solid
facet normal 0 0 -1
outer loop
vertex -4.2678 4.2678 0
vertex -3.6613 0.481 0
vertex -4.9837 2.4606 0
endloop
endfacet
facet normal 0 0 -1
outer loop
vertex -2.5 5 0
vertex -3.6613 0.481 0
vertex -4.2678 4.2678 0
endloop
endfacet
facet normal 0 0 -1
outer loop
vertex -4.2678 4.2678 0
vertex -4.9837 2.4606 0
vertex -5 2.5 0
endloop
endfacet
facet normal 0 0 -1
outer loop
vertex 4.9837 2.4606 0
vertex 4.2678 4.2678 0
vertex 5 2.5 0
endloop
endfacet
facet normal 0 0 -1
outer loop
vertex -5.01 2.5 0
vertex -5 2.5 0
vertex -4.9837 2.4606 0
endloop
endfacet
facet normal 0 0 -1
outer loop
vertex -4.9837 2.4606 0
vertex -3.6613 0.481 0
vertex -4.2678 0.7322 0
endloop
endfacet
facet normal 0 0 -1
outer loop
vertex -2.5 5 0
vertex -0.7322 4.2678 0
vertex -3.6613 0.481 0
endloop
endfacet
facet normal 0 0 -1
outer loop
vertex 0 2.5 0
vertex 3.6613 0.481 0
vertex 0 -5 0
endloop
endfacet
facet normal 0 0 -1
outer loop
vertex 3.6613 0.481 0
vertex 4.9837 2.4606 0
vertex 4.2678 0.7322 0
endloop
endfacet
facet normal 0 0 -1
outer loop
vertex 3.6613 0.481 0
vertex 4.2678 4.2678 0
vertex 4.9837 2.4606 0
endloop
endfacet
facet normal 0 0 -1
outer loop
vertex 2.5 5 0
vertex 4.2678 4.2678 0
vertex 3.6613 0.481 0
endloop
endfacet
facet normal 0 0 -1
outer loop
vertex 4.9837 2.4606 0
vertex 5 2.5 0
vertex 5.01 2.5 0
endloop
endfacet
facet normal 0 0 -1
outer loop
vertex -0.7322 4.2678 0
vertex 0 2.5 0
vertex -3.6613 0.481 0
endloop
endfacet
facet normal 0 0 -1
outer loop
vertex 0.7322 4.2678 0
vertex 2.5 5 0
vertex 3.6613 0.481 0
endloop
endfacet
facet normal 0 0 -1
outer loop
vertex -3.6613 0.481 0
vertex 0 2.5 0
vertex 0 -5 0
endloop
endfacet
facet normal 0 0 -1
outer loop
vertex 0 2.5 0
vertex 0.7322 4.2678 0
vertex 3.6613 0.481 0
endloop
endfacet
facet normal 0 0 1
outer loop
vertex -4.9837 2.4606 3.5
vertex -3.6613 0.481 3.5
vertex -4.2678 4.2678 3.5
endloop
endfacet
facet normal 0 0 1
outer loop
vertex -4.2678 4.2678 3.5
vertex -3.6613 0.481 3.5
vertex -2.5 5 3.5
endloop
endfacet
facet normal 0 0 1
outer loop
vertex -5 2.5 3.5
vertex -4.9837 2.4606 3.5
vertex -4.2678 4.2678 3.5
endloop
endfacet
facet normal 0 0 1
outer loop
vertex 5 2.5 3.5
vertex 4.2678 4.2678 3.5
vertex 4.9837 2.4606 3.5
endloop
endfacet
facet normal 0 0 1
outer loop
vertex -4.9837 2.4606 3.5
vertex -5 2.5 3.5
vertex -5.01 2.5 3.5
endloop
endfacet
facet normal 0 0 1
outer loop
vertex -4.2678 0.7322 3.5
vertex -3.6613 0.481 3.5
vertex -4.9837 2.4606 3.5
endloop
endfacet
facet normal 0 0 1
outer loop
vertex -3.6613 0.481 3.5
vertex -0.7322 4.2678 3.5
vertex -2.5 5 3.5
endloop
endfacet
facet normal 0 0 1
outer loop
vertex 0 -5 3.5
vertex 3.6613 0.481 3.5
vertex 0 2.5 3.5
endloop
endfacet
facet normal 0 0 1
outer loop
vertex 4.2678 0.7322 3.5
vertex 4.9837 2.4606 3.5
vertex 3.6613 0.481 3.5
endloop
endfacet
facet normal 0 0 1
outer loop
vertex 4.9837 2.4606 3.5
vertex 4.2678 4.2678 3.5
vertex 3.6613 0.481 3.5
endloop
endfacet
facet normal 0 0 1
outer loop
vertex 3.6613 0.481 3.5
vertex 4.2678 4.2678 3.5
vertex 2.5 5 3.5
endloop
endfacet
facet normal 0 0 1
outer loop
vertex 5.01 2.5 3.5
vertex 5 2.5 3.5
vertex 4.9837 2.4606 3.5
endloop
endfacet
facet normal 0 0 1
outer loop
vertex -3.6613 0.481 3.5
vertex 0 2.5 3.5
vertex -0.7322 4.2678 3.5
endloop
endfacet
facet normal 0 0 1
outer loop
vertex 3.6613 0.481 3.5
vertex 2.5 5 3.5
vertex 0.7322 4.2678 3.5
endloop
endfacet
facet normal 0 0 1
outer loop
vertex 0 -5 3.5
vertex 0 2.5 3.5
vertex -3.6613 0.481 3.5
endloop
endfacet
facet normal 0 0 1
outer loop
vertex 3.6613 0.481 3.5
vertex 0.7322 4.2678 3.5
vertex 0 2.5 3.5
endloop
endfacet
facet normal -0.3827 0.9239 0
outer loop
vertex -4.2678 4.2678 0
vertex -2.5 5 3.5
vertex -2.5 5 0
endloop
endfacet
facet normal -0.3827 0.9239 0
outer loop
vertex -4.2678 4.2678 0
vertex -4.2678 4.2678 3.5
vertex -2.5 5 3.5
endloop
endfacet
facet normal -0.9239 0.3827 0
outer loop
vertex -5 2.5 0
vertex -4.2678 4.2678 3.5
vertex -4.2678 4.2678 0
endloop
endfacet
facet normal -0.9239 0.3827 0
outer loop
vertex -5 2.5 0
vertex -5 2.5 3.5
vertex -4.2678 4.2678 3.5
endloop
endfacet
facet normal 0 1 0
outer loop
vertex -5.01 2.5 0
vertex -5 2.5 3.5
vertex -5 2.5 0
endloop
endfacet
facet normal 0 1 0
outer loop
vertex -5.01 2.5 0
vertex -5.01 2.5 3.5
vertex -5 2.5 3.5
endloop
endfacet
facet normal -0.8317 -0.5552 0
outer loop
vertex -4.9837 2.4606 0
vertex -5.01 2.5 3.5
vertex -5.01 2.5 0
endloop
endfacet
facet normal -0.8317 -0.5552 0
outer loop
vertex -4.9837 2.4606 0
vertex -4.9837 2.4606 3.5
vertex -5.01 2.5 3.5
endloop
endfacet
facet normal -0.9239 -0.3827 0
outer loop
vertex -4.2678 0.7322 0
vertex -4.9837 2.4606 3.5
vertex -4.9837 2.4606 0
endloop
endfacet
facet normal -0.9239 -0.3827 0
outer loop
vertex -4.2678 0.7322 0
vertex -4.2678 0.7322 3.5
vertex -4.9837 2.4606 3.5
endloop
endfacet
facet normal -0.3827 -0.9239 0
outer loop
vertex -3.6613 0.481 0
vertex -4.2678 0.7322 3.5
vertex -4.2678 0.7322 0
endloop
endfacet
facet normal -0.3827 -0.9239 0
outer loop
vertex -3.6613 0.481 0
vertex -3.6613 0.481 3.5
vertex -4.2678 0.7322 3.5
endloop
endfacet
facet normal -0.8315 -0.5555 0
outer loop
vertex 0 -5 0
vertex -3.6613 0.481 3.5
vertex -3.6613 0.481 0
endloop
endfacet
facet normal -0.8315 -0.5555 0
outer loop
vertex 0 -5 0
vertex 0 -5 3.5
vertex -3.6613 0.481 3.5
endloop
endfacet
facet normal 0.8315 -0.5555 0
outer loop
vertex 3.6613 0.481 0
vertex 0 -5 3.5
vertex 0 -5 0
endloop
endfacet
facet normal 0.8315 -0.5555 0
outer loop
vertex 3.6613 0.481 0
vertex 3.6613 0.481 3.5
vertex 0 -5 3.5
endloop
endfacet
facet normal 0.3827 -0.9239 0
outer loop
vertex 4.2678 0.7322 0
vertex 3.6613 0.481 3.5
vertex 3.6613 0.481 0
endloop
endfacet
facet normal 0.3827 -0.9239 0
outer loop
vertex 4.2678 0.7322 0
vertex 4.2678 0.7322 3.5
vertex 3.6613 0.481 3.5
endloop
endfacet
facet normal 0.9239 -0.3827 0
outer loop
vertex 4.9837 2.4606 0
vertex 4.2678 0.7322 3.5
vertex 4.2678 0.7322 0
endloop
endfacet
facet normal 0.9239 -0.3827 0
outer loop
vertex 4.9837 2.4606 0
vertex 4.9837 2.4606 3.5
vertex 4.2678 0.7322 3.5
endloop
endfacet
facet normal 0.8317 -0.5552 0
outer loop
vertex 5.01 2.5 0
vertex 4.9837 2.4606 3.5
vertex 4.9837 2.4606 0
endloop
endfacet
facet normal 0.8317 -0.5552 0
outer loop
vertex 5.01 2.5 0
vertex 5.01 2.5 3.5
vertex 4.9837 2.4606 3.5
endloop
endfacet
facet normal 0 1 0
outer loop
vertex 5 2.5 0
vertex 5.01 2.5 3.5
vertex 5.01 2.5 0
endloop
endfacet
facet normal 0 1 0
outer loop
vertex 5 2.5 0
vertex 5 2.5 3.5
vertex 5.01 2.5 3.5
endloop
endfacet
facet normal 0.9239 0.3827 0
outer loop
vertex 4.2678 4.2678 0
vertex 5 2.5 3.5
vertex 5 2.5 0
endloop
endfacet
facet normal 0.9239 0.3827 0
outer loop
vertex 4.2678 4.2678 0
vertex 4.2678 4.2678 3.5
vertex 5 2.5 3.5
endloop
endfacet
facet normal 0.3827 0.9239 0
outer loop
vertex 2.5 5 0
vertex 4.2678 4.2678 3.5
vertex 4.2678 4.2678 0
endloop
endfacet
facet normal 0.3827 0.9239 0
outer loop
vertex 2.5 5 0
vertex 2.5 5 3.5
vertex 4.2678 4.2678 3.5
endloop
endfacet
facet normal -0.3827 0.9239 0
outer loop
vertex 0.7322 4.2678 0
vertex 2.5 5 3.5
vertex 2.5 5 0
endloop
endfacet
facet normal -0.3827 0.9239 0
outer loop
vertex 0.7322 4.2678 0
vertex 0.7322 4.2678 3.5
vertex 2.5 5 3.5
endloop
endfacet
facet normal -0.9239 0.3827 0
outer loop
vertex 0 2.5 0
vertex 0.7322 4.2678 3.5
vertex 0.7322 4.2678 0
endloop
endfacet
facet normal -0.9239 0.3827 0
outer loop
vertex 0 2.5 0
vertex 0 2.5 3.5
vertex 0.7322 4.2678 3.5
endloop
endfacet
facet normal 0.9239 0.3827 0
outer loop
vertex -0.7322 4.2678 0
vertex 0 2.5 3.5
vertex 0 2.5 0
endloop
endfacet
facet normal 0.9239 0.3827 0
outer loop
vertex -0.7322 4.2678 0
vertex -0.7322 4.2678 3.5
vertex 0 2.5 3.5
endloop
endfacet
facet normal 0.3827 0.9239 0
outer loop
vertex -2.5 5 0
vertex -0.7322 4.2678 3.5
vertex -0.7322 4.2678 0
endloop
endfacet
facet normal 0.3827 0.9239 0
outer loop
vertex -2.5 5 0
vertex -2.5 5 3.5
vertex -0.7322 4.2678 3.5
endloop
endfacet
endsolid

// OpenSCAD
// studs/heart.scad — geometric heart.
// MIT licensed.
//
// Festival set. Two overlapping circles for the lobes + a downward triangle
// for the point. The kawaii option; pairs with pastel TPU.

module stud_heart(size = 6, tip_radius = 0.4, height = undef) {
    h = is_undef(height) ? size * 0.35 : height;
    // Each circle has radius size/4 and sits at the upper-left / upper-right
    // of the bounding box. The triangle apex is at the bottom center.
    lobe_r = size / 4;
    lobe_y =  size / 4;
    lobe_x =  size / 4;

    linear_extrude(height = h)
        union() {
            translate([-lobe_x, lobe_y]) circle(r = lobe_r);
            translate([ lobe_x, lobe_y]) circle(r = lobe_r);
            polygon([
                [-size / 2 - 0.01, lobe_y],
                [ size / 2 + 0.01, lobe_y],
                [ 0,              -size / 2]
            ]);
        }
}

stud_heart(size = 10);
